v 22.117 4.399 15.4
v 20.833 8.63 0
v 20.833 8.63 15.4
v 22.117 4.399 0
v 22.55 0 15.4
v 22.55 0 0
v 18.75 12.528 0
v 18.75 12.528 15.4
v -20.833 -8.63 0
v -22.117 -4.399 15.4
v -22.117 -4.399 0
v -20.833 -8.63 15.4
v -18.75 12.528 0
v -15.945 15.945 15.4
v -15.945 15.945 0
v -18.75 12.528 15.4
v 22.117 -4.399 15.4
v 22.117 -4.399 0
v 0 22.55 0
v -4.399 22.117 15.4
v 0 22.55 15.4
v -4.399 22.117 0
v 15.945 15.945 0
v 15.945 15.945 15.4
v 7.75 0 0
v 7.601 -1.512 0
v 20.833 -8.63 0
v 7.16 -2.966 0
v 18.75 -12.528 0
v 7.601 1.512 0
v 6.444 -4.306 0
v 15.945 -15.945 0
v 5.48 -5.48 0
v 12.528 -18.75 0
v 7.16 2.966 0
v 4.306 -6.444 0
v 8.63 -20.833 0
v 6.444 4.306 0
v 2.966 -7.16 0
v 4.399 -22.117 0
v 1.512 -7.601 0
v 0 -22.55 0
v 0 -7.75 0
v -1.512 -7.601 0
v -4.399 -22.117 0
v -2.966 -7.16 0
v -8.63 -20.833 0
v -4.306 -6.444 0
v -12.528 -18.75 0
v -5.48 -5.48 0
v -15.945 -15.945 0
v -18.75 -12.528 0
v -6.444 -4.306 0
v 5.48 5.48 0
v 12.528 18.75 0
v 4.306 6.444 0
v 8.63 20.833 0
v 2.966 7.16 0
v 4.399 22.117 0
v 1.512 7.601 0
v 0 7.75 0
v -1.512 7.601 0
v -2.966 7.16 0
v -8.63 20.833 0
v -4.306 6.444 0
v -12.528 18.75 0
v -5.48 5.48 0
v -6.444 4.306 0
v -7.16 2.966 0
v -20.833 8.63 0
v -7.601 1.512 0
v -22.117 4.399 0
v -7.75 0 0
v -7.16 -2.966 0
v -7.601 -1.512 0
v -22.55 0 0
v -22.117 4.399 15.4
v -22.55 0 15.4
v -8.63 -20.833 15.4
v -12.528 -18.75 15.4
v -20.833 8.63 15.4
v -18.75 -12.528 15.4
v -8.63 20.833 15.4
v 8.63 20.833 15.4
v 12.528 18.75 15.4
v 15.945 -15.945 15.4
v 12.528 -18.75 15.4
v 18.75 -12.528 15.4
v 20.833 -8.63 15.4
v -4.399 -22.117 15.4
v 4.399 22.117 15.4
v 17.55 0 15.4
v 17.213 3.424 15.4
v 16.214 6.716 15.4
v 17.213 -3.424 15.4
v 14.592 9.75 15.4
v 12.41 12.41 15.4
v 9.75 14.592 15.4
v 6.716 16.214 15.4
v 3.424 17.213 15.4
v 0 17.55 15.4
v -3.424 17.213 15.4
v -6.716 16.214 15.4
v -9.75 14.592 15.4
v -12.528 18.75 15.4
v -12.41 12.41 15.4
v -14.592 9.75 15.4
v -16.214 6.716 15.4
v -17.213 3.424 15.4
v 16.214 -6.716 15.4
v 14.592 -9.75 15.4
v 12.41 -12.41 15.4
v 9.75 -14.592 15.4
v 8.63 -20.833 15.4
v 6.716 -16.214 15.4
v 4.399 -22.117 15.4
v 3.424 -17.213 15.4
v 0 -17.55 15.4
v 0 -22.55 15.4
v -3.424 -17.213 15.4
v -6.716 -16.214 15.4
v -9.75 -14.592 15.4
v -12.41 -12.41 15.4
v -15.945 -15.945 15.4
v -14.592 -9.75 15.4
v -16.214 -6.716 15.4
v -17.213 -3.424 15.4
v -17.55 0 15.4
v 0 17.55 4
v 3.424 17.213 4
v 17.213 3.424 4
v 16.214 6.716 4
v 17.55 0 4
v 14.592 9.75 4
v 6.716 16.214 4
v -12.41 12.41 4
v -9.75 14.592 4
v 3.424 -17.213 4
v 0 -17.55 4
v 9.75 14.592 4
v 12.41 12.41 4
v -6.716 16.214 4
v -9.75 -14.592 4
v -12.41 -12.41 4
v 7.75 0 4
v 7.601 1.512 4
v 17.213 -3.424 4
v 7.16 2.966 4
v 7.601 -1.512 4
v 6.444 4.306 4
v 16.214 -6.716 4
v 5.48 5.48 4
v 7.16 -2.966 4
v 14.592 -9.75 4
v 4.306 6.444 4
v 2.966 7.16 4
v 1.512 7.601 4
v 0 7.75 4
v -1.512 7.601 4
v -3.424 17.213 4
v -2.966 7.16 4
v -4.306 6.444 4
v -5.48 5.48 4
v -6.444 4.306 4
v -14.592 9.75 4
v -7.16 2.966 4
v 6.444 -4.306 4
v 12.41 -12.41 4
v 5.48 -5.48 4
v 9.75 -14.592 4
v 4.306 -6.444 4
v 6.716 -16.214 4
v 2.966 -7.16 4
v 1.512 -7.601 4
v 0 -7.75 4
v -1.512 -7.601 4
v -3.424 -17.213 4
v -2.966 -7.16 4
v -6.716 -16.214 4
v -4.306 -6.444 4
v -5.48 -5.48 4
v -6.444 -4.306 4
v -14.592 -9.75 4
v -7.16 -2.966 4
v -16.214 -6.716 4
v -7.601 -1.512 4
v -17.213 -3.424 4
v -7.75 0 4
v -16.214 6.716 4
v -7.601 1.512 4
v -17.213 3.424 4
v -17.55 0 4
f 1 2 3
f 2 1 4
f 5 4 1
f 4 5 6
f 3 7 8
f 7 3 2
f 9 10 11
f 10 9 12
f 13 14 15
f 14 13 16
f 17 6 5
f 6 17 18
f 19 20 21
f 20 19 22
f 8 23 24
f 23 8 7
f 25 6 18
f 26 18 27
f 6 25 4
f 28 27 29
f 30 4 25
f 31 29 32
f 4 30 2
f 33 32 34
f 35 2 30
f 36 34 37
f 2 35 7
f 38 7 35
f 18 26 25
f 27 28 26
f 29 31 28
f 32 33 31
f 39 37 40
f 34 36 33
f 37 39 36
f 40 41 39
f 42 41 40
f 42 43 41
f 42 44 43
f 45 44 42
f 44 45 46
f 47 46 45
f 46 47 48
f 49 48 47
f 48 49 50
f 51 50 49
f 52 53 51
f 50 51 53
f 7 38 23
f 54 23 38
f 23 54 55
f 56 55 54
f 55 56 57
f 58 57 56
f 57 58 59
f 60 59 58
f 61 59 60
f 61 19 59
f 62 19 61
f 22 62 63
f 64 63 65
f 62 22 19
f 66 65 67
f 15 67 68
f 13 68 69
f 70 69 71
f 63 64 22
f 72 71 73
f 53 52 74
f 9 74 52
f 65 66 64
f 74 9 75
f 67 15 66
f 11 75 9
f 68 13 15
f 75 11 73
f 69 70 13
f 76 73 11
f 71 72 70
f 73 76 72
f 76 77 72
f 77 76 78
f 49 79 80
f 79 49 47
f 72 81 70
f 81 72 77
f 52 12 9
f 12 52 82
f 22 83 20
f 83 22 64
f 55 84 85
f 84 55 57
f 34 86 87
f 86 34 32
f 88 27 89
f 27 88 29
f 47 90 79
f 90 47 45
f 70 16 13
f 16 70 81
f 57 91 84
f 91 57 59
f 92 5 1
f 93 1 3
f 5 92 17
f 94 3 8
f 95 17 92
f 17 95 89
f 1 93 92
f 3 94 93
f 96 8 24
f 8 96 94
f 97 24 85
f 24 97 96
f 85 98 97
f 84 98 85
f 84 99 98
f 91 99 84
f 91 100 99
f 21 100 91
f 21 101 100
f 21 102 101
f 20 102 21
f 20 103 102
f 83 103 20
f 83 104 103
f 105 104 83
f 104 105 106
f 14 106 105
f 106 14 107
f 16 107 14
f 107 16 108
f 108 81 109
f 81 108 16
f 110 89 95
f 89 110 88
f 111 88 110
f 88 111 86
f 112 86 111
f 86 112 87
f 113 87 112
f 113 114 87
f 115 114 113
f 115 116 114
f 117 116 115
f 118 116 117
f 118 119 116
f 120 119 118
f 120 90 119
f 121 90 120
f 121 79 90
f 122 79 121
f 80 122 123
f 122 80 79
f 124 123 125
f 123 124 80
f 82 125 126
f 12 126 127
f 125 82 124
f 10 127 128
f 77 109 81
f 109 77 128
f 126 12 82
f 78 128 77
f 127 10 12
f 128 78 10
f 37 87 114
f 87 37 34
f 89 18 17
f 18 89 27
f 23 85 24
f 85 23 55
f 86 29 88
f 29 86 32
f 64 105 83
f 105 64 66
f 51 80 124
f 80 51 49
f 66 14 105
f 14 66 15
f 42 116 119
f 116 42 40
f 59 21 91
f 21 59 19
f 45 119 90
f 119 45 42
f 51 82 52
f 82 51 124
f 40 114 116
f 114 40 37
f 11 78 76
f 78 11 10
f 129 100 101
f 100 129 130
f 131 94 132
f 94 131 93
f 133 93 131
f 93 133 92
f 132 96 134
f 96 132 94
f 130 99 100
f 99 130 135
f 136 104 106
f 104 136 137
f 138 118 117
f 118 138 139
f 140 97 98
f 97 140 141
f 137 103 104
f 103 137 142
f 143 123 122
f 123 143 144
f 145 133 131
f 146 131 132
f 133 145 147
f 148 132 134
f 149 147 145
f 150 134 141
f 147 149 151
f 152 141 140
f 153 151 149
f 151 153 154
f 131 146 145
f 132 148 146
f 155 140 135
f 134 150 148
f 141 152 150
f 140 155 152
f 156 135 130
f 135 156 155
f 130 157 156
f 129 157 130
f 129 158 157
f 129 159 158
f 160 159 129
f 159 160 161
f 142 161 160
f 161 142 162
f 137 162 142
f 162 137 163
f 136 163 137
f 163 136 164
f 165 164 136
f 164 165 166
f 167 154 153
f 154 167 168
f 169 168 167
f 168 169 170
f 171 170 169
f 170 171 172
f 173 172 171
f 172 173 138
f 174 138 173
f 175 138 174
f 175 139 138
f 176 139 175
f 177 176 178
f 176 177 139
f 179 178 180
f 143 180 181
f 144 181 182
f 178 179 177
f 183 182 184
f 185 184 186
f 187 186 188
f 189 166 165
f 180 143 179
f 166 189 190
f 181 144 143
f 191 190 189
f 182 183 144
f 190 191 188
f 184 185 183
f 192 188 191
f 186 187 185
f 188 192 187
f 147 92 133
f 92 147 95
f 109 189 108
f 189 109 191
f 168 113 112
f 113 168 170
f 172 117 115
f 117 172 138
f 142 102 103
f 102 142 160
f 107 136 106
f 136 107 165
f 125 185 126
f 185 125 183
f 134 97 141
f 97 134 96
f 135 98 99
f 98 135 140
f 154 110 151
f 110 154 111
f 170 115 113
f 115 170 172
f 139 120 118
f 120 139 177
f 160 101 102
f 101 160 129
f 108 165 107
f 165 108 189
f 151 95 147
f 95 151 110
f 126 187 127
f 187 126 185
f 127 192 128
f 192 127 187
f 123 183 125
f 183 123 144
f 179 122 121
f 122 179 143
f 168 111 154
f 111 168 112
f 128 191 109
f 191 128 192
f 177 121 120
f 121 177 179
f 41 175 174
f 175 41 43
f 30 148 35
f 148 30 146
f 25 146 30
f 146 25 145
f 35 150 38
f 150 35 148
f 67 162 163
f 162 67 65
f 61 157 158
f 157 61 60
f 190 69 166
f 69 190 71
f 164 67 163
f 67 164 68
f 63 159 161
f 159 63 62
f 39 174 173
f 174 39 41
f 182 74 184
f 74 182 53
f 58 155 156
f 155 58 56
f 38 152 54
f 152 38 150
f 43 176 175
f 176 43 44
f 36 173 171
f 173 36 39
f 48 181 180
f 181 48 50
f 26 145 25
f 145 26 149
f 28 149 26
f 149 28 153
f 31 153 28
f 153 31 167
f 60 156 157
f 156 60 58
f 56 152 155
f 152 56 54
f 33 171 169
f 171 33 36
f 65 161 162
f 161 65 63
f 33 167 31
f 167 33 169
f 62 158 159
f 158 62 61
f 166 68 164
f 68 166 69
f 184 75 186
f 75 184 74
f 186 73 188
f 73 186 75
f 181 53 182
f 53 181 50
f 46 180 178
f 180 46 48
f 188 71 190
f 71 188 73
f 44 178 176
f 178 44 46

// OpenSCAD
$fn = 32;

// ----------------------------------------------------------------------
// Bearing housing: seat for 6202 (35 x 11 mm), 45.1 mm body
// ----------------------------------------------------------------------

// --- parameters (mm) ---
case_d = 45.1;            // housing outside diameter
case_h = 15.4;            // overall housing height
rim_t = 5;                // wall thickness
bearing_seat = 35.1;      // 6202 seat, 0.1 mm clearance
seat_h = 11.4;            // pocket depth
shoulder = 4;             // shoulder under the bearing
pass_d = 15.5;            // shaft passage

module body() {
  cylinder(h = case_h, d = case_d);
}

difference() {
  union() {
    body();
  }
  translate([0, 0, case_h - seat_h]) cylinder(h = seat_h + 1, d = bearing_seat);
  translate([0, 0, -1]) cylinder(h = case_h - seat_h + 1, d = pass_d);
}
